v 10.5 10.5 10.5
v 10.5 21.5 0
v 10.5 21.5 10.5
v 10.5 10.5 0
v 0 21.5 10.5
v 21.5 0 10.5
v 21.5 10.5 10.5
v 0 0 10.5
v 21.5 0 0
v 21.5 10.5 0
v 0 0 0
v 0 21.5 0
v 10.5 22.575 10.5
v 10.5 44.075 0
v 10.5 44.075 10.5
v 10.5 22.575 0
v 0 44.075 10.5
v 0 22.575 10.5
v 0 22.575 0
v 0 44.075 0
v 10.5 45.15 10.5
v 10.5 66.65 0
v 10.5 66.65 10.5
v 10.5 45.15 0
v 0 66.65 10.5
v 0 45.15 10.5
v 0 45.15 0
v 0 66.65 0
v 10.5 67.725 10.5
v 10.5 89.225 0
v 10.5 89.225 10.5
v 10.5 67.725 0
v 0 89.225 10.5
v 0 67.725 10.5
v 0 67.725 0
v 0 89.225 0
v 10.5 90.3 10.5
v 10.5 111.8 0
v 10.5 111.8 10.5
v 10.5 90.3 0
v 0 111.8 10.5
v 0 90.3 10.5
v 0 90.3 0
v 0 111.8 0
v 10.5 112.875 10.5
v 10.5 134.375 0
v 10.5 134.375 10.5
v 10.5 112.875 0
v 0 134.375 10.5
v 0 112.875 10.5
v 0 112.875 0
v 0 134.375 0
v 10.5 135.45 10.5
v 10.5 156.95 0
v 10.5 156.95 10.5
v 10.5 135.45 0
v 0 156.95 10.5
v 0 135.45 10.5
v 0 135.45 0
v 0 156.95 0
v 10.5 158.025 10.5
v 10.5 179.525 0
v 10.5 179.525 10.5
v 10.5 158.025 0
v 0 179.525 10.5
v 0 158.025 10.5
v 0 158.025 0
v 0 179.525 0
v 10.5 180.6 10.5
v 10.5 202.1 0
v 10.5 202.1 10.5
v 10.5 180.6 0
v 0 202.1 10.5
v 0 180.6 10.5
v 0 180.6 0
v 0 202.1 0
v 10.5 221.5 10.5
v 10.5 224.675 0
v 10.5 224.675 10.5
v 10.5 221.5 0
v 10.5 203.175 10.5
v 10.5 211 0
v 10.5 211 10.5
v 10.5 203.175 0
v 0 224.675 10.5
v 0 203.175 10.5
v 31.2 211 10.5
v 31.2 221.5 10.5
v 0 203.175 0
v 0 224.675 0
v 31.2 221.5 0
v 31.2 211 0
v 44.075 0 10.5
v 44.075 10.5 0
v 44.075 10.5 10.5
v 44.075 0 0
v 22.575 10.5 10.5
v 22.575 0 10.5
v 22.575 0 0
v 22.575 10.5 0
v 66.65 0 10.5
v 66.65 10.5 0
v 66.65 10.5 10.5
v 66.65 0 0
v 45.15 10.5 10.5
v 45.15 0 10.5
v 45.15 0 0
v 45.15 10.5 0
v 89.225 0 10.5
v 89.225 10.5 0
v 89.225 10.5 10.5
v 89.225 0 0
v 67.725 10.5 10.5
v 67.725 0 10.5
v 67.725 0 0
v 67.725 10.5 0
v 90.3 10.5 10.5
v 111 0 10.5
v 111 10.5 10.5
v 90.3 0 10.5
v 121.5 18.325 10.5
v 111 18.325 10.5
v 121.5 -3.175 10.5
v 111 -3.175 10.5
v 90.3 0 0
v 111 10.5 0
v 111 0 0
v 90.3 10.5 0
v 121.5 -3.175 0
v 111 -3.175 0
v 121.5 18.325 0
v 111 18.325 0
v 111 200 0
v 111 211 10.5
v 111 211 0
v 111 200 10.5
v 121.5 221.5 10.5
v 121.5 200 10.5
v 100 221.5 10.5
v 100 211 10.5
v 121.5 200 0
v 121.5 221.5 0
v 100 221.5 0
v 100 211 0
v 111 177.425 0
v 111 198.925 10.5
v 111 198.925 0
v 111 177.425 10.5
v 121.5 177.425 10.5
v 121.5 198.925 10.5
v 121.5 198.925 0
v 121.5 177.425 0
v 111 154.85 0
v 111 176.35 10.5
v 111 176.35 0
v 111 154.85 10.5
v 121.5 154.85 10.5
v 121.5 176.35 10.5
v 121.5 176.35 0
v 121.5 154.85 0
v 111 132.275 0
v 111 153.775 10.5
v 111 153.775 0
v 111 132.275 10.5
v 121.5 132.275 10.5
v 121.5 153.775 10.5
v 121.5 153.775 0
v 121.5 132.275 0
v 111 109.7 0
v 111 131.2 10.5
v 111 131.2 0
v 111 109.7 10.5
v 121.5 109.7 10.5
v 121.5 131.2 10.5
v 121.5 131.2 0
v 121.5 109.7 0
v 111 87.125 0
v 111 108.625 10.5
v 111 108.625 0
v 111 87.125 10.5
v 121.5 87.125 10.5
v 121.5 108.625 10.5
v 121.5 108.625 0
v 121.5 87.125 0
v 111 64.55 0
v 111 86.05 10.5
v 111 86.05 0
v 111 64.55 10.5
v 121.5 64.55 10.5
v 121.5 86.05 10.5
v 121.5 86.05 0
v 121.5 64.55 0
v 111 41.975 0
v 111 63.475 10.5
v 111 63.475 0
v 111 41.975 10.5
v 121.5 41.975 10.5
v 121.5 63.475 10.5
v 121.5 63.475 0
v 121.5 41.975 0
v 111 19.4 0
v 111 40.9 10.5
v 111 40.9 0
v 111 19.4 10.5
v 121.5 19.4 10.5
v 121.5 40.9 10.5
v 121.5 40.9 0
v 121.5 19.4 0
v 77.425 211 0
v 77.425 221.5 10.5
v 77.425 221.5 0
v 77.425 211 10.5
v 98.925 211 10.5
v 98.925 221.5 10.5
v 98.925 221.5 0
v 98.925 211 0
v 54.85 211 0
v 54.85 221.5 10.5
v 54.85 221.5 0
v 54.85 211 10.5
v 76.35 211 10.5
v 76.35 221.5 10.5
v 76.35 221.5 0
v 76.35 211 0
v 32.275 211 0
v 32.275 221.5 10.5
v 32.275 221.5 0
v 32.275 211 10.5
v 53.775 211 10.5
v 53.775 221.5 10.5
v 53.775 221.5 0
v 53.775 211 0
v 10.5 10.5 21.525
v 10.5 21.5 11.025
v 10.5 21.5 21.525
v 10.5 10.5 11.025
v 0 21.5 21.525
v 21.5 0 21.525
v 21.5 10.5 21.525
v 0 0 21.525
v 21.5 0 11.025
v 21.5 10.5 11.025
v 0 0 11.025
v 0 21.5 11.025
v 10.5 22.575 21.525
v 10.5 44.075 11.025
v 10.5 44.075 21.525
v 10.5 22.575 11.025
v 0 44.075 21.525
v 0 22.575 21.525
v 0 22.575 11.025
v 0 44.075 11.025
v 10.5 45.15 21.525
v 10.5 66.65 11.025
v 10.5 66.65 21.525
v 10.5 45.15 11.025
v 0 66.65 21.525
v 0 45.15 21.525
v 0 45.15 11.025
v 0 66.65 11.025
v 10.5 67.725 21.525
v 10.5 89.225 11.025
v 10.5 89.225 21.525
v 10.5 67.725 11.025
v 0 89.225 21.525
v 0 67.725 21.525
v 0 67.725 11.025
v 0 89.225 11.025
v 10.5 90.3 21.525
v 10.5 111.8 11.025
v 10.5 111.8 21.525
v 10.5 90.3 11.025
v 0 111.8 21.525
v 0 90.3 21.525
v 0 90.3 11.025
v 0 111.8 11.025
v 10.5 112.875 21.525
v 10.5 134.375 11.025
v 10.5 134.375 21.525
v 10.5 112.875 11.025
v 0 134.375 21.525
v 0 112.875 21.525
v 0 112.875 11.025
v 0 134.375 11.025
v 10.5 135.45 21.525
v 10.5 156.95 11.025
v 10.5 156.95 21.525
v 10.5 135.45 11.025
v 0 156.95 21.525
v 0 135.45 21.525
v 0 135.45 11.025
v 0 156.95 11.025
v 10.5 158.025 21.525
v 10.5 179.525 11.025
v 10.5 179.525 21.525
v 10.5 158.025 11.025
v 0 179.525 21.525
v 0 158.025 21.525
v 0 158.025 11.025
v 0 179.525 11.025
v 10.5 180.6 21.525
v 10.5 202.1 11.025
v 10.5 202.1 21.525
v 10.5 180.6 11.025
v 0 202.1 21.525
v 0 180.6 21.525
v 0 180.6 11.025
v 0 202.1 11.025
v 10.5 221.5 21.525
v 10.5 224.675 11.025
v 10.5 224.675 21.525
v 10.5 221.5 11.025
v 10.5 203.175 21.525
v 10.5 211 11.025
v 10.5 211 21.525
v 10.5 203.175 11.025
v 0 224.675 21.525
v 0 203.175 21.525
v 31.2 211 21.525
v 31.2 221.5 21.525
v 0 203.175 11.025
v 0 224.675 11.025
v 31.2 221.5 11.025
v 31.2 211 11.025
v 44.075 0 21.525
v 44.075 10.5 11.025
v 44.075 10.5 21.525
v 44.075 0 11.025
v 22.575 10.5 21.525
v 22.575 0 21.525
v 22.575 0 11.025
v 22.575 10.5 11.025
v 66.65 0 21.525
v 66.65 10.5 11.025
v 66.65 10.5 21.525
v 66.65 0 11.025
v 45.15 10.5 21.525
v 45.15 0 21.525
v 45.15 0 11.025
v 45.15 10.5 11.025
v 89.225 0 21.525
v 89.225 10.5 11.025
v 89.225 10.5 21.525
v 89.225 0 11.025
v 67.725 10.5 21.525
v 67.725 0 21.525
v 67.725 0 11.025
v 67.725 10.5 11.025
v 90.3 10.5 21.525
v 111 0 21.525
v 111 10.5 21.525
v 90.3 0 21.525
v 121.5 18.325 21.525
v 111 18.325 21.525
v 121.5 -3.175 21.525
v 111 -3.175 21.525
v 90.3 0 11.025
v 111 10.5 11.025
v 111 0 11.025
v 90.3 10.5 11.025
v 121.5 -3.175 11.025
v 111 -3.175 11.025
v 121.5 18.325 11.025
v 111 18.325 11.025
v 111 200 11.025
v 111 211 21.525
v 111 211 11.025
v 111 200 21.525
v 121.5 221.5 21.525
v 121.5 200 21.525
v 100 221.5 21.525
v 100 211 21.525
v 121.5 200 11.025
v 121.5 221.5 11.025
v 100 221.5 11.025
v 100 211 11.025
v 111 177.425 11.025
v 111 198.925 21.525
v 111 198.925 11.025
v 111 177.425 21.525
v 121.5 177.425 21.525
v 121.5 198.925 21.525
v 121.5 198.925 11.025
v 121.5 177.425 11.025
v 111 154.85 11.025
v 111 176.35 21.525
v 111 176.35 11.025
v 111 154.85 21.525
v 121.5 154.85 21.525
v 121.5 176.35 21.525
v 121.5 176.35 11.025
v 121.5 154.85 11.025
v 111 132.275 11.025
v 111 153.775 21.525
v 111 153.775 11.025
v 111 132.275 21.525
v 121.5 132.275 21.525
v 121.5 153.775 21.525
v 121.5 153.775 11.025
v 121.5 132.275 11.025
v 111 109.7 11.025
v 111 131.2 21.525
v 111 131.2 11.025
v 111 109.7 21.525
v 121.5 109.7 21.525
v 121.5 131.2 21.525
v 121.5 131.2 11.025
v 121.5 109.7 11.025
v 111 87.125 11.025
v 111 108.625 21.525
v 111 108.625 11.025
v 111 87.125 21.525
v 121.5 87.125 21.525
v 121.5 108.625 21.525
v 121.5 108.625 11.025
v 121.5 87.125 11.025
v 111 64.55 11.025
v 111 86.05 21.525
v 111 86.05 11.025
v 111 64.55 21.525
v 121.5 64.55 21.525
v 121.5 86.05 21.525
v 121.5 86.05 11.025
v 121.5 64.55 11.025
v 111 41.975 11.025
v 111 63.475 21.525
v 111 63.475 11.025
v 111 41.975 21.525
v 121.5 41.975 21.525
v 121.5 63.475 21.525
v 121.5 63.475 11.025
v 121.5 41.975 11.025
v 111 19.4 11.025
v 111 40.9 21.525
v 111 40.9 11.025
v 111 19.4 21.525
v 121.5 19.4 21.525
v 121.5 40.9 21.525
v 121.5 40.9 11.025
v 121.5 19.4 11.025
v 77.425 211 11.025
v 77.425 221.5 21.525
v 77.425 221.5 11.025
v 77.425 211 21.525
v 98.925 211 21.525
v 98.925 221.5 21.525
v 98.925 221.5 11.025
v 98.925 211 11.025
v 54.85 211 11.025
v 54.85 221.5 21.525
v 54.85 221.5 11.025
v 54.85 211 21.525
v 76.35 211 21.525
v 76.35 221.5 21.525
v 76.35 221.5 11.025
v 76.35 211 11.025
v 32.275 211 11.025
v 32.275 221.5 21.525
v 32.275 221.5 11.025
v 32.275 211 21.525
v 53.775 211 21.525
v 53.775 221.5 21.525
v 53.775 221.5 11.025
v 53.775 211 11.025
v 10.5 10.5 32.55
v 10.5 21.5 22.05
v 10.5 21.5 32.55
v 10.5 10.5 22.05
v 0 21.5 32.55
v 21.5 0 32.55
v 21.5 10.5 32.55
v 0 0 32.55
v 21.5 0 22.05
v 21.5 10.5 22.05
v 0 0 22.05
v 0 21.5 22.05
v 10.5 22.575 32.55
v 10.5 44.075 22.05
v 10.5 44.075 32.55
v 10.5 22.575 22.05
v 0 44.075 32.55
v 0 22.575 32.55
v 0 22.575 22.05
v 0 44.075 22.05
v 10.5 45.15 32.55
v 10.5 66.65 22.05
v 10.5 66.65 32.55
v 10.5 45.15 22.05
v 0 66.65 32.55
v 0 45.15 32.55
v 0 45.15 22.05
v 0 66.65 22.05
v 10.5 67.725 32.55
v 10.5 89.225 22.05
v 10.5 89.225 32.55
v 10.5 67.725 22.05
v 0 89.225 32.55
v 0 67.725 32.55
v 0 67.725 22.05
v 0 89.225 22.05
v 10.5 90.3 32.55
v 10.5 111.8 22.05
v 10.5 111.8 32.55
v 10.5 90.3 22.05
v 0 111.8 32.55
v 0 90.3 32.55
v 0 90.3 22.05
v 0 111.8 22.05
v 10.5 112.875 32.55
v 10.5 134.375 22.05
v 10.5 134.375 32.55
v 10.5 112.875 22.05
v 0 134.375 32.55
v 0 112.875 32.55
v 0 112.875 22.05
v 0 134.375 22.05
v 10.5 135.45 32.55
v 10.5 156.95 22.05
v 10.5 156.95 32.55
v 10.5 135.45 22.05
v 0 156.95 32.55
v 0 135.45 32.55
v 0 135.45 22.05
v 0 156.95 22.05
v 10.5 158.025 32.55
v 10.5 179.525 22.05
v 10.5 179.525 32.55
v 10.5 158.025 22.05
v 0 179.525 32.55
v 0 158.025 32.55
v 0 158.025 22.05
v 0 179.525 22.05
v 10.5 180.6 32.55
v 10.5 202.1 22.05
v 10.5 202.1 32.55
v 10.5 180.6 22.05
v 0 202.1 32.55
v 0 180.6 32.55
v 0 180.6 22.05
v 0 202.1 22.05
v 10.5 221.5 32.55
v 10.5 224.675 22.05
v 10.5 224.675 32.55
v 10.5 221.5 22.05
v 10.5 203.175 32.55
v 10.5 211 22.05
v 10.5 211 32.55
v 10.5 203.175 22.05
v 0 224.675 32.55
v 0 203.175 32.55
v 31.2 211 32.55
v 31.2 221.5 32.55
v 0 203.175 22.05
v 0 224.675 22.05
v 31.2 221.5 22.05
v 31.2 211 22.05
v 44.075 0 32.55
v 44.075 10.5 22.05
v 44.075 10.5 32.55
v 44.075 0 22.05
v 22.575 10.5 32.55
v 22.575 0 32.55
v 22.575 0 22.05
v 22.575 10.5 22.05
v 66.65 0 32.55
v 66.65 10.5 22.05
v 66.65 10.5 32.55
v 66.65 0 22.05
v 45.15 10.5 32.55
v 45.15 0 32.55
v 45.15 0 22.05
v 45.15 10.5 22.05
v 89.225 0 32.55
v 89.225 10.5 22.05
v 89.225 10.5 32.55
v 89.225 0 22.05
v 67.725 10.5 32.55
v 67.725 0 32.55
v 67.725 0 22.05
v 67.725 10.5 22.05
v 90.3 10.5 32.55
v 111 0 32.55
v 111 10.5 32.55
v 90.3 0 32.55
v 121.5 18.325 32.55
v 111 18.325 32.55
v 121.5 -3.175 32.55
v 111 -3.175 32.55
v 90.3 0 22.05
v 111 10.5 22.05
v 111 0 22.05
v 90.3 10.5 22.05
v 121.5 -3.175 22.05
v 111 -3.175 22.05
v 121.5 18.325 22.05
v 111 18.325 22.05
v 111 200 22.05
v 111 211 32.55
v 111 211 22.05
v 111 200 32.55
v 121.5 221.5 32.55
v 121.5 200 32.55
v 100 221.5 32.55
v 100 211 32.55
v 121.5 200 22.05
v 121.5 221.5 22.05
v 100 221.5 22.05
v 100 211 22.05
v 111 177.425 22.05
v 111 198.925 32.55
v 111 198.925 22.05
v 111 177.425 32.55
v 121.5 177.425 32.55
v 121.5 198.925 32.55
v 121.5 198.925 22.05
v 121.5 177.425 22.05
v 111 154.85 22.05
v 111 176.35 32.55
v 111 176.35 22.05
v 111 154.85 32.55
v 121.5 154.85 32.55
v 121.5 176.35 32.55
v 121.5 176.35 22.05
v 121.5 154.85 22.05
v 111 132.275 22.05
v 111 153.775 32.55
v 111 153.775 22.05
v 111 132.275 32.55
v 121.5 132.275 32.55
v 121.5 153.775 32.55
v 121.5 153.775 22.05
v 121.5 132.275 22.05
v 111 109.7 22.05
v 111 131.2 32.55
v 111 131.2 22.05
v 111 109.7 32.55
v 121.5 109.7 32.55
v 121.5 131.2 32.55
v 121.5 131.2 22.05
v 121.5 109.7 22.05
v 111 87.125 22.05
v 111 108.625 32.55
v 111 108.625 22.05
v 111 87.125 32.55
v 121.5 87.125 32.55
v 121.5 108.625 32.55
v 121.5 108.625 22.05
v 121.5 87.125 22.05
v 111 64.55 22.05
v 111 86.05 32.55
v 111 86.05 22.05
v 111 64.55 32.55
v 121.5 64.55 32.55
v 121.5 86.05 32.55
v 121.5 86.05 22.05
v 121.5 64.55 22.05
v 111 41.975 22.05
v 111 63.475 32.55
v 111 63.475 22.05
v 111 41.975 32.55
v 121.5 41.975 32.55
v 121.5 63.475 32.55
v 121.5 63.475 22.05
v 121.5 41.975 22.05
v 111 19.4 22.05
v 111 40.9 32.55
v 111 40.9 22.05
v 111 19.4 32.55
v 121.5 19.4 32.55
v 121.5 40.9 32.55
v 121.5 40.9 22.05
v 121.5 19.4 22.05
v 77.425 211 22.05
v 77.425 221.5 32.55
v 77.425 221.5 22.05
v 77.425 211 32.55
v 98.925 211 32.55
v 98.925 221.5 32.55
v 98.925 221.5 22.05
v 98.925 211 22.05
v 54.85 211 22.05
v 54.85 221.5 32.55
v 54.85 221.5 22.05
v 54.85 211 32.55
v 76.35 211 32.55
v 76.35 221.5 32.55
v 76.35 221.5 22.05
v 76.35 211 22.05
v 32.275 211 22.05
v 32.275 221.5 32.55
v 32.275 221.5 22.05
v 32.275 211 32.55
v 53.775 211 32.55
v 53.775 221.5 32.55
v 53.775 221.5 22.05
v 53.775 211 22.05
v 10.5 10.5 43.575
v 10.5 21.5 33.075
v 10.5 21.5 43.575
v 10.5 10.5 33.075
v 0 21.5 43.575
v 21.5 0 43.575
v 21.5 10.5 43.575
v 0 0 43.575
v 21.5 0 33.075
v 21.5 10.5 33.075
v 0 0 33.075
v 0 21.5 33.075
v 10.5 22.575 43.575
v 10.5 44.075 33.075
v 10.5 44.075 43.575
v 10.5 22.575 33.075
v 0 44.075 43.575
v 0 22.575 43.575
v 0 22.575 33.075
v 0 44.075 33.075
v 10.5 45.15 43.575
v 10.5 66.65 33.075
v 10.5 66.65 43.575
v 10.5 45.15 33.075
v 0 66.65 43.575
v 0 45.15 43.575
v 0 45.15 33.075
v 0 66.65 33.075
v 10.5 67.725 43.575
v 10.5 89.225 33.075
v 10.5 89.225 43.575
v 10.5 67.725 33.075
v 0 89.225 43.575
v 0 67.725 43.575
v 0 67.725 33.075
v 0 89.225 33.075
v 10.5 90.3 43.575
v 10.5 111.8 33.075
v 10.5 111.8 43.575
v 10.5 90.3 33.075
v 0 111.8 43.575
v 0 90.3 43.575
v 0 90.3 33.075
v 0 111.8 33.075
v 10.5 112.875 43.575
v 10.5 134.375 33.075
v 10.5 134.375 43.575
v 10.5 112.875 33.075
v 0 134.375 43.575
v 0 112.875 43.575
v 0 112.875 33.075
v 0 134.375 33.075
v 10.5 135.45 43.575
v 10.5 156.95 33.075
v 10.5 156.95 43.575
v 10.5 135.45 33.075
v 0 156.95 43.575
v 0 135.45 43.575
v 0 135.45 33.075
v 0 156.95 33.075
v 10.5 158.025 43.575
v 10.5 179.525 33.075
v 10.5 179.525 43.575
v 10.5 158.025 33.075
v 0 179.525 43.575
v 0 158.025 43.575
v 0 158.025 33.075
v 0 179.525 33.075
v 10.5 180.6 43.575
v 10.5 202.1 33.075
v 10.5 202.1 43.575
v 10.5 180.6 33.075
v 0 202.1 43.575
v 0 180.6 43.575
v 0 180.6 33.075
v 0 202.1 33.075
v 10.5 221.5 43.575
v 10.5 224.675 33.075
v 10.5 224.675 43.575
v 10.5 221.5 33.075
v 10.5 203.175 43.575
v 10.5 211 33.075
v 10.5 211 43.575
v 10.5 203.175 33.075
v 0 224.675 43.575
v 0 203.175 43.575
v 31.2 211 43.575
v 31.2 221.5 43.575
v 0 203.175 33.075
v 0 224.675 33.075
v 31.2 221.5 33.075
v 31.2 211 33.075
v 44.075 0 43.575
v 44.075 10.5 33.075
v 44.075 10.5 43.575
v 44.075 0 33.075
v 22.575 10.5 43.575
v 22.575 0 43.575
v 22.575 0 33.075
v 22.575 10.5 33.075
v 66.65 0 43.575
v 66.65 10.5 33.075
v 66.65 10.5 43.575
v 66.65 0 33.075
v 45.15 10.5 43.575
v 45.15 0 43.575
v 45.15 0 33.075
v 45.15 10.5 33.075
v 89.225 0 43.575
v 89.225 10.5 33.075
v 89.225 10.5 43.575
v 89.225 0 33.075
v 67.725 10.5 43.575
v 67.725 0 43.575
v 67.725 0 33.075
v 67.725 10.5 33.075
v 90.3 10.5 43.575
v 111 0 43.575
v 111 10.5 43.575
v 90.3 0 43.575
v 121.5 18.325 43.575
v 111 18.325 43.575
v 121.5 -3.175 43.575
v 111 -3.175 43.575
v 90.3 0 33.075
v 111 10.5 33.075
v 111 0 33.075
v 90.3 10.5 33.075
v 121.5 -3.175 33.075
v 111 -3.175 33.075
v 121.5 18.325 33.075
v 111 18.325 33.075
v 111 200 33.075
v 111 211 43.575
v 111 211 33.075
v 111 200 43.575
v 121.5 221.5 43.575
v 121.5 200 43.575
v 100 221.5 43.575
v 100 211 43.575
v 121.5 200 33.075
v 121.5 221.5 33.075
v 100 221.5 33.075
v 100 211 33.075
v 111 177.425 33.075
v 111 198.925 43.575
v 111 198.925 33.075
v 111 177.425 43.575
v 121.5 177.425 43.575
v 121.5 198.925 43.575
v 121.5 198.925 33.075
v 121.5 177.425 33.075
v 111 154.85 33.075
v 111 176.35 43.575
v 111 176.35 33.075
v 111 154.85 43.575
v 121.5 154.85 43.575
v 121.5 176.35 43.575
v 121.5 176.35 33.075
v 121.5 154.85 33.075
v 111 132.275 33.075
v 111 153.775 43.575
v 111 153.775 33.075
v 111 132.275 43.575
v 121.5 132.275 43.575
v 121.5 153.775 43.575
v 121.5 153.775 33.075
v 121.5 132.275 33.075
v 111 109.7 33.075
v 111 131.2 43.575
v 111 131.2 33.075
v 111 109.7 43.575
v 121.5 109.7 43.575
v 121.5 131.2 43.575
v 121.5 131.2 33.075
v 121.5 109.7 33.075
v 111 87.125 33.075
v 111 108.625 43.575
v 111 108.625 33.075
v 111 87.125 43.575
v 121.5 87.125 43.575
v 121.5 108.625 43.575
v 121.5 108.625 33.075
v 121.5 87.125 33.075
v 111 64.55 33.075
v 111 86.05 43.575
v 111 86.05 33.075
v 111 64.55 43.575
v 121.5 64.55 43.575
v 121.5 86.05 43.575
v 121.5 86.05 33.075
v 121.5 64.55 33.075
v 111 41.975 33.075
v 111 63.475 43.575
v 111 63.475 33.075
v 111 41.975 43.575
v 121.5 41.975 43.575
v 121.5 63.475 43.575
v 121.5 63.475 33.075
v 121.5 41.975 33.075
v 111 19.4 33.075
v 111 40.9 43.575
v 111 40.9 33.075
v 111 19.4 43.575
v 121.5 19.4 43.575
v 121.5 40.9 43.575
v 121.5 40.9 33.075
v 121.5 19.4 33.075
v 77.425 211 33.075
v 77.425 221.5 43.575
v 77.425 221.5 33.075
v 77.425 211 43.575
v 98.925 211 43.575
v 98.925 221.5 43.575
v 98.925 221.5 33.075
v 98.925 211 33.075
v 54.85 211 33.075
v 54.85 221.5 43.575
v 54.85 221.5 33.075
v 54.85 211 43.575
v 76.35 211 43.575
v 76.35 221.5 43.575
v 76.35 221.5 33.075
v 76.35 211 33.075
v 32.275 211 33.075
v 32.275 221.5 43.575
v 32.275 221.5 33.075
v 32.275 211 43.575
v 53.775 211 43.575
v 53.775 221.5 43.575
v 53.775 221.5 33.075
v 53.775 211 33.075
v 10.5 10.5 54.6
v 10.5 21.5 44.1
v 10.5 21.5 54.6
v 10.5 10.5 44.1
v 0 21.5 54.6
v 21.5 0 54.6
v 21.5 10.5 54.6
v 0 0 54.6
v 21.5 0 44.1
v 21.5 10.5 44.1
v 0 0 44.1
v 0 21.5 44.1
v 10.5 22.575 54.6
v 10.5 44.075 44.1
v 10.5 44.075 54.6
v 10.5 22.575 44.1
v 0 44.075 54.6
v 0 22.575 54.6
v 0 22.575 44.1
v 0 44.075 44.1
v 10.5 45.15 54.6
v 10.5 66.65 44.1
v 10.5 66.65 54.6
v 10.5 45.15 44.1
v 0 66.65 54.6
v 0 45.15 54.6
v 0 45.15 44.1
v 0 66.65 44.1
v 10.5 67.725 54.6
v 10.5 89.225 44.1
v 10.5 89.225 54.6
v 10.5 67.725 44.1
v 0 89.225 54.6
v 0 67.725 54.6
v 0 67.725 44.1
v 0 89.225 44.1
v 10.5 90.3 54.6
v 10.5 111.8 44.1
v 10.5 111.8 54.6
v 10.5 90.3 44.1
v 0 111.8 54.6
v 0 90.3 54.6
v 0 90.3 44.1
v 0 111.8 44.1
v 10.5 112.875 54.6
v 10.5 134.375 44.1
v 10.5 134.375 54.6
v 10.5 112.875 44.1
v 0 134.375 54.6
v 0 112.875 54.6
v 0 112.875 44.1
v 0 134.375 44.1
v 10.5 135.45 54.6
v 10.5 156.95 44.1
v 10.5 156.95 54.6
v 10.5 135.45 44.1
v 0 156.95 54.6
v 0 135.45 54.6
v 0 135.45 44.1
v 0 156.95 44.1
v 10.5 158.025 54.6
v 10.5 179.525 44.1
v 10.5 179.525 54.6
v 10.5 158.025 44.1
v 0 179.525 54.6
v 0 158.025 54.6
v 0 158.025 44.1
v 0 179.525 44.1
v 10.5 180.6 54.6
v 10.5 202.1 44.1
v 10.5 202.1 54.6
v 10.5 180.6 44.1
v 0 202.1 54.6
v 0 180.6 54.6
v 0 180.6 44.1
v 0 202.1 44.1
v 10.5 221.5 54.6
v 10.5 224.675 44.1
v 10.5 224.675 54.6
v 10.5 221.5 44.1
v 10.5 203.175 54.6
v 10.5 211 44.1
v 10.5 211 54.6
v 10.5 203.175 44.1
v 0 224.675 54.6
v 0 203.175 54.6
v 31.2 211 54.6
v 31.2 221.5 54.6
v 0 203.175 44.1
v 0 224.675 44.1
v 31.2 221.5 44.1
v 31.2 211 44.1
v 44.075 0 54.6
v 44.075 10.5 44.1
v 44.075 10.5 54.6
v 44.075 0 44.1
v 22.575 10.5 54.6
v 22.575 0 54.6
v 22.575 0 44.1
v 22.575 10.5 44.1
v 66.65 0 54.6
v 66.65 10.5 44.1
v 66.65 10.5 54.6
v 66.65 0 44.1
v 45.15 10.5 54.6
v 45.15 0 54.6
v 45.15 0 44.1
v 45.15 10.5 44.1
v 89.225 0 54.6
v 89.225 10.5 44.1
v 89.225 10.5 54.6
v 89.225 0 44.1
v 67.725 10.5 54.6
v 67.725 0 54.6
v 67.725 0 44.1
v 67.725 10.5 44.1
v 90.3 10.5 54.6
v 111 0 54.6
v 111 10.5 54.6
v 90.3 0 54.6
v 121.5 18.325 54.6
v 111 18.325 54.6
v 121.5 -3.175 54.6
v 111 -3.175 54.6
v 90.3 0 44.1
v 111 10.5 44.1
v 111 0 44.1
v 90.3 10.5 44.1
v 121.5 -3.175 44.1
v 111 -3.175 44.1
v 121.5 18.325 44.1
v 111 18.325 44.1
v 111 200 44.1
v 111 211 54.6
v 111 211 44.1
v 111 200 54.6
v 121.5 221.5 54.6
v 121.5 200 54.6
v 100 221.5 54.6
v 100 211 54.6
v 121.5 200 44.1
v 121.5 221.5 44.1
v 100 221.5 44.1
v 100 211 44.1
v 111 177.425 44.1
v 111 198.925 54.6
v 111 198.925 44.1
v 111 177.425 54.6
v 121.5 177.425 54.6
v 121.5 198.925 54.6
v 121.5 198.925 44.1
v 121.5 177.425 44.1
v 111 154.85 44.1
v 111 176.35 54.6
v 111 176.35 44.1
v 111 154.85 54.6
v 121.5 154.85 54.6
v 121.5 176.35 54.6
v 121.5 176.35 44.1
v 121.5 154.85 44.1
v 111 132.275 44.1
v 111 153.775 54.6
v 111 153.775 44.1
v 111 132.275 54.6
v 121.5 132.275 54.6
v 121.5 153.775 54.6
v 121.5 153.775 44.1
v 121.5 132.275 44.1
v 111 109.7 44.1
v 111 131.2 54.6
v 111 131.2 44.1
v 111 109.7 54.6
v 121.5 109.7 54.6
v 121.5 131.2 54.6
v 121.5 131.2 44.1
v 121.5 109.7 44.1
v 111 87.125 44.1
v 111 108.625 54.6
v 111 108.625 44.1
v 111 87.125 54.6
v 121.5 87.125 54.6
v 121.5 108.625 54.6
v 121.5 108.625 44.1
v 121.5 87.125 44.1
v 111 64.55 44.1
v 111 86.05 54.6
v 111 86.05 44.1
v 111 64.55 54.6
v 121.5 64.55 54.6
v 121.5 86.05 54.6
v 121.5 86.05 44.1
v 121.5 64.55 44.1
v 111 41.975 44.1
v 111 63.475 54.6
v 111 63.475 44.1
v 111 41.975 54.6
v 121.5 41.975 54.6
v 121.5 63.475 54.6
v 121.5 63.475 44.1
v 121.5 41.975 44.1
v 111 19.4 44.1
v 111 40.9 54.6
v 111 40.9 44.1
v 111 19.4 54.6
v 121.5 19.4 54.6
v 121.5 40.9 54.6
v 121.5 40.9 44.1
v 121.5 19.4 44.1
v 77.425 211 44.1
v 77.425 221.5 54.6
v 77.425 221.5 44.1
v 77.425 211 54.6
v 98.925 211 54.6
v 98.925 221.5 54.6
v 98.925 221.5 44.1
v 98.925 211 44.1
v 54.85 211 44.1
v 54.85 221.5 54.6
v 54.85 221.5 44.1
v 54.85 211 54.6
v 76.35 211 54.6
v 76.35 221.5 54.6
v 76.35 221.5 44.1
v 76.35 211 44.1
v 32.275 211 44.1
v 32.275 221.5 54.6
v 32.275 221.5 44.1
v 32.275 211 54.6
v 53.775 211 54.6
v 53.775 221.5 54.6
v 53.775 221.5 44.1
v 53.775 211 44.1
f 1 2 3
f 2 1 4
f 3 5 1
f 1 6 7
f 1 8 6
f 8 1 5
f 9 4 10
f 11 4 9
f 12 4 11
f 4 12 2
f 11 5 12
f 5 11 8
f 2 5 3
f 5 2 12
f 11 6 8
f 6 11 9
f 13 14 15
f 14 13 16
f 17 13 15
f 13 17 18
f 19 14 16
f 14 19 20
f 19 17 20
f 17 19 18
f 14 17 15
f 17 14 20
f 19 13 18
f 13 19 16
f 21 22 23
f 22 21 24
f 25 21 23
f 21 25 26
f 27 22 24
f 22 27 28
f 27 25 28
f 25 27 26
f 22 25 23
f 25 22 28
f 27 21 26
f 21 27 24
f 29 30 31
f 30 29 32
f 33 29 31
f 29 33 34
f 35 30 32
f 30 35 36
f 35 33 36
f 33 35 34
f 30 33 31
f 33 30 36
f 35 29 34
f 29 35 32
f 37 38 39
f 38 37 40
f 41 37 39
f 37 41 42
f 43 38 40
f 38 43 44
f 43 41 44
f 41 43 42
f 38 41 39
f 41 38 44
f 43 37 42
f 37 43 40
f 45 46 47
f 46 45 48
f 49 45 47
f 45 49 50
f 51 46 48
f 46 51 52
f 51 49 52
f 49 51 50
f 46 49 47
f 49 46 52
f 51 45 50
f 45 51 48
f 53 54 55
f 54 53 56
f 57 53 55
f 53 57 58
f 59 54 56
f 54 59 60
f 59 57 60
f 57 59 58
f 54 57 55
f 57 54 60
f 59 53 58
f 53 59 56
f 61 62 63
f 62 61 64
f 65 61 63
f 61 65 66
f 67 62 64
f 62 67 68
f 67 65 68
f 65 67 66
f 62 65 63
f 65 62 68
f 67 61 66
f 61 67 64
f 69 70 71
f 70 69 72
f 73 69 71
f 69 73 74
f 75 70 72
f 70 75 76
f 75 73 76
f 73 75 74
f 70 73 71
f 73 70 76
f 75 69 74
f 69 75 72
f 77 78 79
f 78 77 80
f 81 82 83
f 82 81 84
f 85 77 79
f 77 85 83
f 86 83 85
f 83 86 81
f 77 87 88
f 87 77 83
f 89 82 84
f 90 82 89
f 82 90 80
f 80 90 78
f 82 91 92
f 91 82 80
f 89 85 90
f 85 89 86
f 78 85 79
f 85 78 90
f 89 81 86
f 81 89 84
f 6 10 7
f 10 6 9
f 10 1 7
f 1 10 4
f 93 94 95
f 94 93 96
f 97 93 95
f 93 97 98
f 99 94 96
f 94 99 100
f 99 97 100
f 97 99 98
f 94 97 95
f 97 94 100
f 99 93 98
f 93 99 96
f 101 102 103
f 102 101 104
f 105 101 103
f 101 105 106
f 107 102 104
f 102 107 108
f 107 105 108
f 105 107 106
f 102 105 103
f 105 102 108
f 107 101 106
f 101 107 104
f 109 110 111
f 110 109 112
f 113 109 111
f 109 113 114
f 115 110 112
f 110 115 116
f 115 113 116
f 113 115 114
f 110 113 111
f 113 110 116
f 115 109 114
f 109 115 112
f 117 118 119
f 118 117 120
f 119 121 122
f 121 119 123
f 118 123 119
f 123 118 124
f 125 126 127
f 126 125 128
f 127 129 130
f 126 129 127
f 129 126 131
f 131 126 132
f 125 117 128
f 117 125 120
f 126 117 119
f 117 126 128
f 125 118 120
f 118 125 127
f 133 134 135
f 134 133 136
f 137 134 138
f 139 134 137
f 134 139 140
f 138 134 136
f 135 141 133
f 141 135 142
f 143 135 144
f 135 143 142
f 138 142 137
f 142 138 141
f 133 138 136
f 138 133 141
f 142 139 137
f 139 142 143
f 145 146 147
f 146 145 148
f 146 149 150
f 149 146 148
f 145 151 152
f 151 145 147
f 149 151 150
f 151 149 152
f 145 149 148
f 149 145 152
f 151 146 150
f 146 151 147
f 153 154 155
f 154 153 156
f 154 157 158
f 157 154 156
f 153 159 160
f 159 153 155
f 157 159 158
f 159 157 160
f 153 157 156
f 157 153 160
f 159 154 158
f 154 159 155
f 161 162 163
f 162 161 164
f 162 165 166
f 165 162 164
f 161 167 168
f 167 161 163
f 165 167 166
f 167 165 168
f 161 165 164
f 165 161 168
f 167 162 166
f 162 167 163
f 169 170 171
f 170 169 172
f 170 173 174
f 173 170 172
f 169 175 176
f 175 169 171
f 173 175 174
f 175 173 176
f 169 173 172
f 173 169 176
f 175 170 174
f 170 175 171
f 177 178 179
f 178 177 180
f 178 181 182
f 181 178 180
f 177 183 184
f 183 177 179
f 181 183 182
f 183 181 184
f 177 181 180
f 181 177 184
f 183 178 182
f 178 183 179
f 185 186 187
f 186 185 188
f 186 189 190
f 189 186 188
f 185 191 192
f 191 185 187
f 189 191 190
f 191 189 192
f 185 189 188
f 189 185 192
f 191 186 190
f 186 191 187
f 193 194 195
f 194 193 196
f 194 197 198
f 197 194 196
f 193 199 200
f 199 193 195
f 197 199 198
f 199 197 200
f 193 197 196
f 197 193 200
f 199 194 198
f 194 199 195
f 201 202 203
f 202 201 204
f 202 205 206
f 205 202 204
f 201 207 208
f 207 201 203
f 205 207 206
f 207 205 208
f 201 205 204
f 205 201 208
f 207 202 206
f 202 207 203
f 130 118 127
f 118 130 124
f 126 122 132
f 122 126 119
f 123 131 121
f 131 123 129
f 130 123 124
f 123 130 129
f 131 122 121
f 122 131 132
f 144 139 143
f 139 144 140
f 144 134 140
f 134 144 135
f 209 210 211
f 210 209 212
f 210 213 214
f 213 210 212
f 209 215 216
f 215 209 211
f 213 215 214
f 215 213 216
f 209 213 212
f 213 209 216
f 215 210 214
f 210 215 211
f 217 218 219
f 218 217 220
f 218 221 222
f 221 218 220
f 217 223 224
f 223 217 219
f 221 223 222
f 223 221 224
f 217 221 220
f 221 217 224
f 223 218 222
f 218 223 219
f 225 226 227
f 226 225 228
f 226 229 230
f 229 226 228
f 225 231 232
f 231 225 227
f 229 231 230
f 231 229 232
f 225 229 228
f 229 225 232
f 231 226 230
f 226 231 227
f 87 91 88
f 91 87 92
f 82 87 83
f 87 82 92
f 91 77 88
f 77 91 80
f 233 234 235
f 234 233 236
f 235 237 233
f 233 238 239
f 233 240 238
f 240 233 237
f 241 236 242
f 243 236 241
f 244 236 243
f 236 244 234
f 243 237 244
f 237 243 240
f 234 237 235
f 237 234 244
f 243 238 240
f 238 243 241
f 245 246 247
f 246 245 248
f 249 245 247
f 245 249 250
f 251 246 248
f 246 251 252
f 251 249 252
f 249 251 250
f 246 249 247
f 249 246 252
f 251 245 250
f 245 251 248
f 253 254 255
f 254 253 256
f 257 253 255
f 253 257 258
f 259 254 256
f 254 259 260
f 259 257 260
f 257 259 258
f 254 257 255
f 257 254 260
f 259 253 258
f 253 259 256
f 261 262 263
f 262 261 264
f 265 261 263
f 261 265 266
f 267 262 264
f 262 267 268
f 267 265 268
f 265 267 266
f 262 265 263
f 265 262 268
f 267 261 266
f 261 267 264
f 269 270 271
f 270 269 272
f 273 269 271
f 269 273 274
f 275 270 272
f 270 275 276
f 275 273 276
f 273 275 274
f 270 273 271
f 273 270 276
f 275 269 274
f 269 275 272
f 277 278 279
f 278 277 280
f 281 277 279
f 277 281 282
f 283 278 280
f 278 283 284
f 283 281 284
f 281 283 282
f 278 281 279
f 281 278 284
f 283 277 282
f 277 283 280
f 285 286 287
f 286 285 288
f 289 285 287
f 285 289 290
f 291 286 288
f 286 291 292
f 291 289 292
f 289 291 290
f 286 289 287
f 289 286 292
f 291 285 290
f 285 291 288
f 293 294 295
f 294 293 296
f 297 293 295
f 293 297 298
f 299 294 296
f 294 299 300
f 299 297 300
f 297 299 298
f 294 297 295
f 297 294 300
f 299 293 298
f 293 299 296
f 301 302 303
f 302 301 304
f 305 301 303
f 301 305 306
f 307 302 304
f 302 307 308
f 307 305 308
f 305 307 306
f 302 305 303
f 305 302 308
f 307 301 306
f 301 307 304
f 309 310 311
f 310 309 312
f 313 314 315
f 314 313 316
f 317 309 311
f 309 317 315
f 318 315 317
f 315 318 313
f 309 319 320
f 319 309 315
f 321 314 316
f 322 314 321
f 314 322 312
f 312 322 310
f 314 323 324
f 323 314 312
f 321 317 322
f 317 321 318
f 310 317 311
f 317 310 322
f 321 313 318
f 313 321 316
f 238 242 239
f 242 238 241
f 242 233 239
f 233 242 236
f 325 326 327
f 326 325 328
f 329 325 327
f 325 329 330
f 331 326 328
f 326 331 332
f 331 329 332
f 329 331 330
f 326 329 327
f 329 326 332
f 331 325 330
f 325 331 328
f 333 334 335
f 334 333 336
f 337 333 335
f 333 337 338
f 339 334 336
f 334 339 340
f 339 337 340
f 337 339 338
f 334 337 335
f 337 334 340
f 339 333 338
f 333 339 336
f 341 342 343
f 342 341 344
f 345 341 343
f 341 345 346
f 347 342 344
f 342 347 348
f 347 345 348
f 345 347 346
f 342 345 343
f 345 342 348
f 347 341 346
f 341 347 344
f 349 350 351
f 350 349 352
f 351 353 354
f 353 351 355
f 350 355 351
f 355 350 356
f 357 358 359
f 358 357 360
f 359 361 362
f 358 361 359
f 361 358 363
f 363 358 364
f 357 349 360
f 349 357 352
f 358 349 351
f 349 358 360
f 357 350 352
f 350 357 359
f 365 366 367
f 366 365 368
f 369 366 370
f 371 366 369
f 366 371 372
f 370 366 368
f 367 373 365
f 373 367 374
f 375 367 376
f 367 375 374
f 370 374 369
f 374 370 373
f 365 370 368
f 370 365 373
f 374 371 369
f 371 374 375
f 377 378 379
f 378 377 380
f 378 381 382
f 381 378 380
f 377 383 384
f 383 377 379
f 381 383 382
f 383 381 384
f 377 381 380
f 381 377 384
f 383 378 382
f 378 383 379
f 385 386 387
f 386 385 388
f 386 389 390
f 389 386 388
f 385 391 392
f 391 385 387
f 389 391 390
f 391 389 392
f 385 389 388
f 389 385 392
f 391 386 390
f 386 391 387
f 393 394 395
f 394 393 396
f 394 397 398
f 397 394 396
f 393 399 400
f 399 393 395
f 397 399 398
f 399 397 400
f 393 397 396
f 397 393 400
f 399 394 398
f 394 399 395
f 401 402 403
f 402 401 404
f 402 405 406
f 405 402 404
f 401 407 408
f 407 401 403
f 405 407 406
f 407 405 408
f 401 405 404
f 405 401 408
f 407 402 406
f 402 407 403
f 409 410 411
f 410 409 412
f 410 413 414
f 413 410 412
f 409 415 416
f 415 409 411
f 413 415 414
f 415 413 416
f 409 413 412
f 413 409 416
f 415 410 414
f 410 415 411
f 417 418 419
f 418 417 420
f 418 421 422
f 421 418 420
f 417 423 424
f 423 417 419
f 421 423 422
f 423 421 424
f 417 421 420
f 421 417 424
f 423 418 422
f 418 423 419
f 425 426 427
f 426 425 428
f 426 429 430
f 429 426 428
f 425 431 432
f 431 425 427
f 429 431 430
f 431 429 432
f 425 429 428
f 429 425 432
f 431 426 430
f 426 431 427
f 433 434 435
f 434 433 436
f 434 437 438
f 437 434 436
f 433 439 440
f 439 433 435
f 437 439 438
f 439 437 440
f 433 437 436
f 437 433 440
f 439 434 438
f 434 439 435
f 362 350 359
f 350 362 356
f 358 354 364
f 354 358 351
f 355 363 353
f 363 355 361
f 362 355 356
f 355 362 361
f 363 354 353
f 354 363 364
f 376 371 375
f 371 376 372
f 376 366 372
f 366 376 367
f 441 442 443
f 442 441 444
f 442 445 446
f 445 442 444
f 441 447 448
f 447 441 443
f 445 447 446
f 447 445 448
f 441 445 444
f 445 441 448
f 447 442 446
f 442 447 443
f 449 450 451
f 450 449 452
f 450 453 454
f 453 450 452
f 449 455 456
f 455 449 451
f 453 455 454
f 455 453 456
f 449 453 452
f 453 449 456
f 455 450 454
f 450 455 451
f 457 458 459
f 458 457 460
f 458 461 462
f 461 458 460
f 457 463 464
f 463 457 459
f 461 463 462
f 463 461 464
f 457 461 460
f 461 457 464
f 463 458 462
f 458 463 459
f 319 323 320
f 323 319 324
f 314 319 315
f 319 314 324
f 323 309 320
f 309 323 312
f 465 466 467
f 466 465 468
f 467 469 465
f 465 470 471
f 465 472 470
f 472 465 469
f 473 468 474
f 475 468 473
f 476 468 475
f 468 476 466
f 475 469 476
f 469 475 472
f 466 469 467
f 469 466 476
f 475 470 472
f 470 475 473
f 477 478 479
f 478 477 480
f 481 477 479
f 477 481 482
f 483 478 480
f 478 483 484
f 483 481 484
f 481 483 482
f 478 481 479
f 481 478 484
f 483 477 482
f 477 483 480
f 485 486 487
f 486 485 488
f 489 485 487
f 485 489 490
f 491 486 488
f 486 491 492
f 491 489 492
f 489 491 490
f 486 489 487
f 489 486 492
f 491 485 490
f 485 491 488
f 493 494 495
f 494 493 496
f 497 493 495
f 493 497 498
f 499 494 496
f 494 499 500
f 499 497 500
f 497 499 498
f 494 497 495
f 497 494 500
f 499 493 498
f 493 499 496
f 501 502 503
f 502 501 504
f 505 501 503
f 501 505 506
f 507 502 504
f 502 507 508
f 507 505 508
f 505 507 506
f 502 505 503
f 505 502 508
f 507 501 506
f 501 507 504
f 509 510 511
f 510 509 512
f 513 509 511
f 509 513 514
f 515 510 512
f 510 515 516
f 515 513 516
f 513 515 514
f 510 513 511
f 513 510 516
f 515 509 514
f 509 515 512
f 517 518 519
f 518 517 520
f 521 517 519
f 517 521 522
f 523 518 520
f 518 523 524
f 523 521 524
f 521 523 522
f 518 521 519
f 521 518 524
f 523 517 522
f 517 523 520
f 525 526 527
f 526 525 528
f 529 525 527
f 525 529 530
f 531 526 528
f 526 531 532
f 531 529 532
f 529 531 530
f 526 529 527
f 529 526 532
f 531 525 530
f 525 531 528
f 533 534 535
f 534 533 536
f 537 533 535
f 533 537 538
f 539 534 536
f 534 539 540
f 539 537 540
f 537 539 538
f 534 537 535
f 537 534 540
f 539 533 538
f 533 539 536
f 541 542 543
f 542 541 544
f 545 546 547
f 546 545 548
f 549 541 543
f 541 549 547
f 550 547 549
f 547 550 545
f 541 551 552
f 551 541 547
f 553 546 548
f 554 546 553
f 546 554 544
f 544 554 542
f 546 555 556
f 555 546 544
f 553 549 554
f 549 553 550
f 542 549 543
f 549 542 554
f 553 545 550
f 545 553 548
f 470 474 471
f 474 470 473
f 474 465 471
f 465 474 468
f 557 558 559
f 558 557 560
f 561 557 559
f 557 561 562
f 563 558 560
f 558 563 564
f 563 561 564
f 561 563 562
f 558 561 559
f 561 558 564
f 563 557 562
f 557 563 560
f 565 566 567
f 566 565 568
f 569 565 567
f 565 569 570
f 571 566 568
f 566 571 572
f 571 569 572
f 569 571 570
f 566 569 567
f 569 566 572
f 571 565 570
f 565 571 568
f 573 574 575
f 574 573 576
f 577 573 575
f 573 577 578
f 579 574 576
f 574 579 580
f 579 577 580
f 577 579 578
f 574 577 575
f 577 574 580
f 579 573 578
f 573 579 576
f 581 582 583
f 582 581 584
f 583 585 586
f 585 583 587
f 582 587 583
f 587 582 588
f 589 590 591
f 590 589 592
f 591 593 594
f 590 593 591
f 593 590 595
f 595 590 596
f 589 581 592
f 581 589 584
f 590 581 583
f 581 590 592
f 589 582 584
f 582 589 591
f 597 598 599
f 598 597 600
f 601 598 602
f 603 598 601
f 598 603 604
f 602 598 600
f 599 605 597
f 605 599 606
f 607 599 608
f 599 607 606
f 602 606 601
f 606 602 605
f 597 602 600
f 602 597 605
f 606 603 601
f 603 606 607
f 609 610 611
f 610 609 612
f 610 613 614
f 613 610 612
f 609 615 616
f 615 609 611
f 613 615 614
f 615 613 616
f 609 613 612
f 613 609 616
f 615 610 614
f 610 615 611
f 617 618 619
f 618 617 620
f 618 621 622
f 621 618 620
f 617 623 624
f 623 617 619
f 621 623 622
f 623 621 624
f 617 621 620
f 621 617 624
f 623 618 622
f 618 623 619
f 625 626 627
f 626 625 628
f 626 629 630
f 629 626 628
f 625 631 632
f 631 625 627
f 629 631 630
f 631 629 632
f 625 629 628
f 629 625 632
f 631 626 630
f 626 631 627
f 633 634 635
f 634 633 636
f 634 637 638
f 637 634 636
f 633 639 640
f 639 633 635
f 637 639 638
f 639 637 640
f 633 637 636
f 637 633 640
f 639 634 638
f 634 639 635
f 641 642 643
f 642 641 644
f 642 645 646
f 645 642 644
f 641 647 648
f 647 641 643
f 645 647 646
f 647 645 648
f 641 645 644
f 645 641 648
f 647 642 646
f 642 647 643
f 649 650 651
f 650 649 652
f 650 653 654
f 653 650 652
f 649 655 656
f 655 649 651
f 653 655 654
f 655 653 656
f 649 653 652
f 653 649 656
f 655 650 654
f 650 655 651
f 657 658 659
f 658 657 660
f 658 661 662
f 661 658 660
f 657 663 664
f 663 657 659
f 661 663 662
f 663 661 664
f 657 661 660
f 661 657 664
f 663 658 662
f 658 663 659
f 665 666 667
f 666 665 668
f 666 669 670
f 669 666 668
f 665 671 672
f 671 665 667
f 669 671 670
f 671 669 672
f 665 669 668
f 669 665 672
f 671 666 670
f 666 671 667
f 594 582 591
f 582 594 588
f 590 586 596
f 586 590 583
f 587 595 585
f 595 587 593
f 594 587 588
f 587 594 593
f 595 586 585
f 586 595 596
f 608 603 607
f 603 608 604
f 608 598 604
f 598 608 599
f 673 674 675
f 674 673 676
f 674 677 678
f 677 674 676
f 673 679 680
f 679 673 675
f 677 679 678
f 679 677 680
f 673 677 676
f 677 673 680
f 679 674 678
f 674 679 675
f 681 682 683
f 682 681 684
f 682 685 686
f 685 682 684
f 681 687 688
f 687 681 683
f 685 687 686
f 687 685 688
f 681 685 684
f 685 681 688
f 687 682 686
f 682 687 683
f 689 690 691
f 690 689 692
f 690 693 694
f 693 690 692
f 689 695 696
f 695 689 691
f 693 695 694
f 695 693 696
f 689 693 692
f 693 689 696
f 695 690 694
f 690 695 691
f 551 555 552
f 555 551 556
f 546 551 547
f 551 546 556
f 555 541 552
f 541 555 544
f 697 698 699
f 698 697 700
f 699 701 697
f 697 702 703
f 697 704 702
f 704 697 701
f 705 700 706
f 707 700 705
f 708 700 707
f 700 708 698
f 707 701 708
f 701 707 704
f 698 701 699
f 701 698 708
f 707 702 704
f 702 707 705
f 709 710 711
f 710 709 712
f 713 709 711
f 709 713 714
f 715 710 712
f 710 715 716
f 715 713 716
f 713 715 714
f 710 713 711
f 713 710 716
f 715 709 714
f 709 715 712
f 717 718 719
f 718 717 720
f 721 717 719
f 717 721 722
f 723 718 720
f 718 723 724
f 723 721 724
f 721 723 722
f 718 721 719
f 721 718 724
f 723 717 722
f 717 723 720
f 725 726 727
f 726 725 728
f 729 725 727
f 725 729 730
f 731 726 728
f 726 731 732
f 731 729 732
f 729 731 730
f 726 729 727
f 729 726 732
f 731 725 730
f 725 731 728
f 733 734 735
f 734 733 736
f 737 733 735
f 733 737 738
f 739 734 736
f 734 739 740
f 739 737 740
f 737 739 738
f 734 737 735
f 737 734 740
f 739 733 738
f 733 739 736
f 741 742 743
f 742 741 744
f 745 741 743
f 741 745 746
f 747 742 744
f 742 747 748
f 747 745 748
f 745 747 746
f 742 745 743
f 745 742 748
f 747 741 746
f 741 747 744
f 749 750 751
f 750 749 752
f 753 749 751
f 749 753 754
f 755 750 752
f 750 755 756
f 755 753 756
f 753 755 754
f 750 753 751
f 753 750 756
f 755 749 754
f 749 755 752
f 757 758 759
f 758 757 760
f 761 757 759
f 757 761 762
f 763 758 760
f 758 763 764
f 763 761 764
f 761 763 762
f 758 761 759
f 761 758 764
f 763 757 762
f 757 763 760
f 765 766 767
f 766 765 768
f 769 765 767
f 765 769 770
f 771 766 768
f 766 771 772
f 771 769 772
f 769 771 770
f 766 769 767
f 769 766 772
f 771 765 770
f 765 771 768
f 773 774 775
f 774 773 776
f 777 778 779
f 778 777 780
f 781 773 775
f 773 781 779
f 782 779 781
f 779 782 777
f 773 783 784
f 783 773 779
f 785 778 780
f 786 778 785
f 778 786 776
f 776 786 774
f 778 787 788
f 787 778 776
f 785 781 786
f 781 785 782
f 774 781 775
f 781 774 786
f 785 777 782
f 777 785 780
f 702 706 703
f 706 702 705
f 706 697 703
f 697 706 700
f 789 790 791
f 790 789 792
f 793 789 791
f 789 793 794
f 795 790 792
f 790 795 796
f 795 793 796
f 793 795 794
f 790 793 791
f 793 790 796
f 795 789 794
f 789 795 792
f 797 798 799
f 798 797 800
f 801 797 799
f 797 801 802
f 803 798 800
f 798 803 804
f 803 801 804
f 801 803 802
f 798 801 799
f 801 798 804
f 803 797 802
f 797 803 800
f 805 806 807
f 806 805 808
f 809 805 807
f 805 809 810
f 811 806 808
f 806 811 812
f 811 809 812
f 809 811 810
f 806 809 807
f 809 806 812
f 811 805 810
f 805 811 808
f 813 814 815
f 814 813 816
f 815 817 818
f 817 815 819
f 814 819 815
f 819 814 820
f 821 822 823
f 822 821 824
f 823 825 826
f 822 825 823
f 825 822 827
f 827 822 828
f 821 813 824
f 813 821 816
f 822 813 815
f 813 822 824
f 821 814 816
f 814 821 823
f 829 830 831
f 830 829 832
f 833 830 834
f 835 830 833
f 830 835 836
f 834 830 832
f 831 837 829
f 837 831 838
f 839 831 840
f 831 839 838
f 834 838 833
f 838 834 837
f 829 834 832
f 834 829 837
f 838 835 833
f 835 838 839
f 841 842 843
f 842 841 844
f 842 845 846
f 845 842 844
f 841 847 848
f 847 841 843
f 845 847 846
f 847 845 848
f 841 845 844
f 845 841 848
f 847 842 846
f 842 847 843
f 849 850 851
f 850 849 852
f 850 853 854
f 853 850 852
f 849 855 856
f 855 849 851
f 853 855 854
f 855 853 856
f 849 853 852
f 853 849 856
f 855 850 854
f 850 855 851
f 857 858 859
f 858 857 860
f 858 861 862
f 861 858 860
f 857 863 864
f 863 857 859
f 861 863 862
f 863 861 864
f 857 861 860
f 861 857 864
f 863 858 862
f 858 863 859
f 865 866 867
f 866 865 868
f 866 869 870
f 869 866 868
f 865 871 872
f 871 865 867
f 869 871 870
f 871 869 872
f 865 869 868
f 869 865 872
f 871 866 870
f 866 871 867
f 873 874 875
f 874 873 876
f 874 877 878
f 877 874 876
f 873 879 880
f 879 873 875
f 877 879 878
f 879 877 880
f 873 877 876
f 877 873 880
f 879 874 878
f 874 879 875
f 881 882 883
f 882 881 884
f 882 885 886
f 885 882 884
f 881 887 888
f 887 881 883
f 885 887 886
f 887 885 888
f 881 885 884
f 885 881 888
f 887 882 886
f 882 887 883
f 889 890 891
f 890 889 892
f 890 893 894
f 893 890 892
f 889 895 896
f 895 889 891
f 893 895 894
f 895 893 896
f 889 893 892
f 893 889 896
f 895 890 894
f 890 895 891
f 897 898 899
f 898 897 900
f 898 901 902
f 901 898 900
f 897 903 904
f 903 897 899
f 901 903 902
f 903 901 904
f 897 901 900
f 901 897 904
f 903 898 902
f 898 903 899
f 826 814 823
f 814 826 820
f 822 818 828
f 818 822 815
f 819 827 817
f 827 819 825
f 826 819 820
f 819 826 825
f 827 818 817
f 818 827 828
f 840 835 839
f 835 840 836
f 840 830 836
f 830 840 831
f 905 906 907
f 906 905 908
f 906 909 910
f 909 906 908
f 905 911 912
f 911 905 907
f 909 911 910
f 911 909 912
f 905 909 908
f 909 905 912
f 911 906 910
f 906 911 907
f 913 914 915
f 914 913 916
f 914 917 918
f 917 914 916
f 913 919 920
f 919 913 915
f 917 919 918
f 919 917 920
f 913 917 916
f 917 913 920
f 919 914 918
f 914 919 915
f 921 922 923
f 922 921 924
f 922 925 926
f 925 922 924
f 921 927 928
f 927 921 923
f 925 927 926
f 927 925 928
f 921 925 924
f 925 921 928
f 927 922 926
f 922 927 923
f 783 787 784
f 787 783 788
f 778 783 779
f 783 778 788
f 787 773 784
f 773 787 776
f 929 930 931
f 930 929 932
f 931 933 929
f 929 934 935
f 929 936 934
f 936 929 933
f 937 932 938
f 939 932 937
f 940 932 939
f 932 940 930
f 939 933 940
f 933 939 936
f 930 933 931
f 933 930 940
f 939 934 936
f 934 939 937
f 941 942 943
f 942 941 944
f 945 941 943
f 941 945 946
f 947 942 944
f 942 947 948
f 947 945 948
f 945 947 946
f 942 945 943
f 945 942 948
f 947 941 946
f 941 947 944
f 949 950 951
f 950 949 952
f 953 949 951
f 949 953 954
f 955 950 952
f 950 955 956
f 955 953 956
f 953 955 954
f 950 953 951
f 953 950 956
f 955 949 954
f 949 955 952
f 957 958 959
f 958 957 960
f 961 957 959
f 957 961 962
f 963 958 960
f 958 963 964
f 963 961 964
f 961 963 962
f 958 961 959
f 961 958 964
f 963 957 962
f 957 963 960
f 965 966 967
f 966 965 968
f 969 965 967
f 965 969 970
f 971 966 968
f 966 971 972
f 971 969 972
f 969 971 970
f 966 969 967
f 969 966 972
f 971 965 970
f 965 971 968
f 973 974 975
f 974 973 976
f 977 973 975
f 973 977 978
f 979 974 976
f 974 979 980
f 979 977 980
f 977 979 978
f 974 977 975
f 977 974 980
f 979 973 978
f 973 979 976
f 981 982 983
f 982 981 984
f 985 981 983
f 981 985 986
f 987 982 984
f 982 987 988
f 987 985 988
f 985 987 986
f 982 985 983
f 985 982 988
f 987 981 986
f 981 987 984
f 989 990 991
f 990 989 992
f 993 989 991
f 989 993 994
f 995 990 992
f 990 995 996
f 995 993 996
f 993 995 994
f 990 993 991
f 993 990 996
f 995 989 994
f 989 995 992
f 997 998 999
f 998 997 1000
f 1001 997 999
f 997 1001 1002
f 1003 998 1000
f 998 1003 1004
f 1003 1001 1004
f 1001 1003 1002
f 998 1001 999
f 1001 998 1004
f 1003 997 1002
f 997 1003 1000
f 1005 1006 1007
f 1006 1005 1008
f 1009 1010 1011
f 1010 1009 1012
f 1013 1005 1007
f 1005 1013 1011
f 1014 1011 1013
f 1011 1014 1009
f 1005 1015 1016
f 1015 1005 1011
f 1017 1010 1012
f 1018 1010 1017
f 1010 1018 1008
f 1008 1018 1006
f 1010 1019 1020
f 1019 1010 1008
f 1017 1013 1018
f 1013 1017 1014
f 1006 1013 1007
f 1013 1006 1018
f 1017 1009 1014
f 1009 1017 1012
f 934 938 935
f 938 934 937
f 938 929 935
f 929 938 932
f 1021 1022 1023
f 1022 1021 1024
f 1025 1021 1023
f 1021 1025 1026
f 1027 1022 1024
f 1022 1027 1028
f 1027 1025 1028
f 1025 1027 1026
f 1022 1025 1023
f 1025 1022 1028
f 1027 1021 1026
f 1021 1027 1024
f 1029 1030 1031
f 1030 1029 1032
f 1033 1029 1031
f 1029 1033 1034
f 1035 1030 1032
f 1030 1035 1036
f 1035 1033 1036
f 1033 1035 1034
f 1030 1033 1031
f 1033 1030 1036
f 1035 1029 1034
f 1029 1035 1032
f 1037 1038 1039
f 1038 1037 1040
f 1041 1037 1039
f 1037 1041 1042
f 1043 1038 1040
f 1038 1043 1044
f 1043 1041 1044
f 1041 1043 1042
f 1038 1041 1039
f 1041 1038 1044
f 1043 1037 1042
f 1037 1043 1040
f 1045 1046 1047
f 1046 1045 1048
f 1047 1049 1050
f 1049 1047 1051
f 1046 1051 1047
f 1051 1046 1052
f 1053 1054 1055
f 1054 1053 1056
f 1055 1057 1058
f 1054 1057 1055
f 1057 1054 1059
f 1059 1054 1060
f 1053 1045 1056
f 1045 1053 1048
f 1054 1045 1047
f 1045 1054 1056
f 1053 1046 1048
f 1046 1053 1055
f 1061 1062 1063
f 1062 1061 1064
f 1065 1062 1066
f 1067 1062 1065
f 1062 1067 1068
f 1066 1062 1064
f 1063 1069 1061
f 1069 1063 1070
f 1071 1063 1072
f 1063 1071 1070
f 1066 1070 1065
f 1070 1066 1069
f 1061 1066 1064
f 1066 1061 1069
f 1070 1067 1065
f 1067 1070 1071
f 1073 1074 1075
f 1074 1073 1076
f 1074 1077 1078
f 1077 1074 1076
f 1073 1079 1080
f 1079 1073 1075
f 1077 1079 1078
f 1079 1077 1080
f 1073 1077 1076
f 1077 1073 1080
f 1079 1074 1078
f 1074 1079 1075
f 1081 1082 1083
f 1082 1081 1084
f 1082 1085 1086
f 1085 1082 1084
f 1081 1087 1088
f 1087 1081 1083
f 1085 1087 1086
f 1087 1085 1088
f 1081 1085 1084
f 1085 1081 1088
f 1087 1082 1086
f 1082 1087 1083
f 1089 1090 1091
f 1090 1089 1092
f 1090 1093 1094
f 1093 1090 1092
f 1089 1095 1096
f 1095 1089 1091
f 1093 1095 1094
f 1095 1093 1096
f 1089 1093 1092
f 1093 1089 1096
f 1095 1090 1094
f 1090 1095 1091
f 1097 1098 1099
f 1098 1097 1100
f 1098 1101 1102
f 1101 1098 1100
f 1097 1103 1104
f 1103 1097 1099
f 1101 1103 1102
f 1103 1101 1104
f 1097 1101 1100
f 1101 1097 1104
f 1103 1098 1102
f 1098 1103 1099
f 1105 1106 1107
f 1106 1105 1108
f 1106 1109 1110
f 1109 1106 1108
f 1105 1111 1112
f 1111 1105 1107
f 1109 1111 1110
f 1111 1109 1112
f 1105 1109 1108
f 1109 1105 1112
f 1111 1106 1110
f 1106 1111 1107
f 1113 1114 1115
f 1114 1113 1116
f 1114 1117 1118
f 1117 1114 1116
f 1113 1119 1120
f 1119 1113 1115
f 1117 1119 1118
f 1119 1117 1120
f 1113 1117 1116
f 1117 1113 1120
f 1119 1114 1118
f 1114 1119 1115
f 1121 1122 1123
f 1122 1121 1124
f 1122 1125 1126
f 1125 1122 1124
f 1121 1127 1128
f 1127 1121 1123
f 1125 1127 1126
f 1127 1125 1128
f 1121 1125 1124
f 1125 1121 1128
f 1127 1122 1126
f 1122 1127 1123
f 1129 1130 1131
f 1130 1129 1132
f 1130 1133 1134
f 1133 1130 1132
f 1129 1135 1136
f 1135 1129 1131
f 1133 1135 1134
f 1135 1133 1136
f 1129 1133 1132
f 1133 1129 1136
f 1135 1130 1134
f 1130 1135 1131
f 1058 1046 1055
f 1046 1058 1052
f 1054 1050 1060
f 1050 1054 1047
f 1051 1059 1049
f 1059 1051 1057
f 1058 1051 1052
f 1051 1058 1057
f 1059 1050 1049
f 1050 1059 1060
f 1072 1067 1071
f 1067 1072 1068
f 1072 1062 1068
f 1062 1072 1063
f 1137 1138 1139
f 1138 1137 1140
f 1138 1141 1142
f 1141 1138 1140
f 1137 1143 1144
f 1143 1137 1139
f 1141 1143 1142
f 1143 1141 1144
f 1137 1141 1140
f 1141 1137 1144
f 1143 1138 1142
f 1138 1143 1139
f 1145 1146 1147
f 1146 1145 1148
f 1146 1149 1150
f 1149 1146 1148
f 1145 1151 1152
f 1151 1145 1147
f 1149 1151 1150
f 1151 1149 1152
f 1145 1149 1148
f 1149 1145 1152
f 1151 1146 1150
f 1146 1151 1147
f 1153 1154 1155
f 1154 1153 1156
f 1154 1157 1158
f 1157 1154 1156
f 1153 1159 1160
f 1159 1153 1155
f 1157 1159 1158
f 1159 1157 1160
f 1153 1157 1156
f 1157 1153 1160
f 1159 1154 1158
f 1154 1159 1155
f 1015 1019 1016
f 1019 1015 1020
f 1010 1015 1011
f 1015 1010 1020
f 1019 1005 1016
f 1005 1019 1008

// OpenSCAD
/*This is just a very basic model that generates the brick reservoir based on the size of the digester*/

/*Digester Size*/
dl=200;//length
dw=100;//width
dh=50;


/*Brick Parameters*/
h=10.5;//height
w=10.5;//width
l=21.5;//length

i_end=dl/l;
z_end=dw/l;
y_end=dh/h;



module frame(){
module line(){
for (i=[0:i_end])
   translate([0,i*(l+l*0.05),0])
     cube([w,l,h]);


for (z=[0:z_end])
   translate([z*(l+l*0.05),0,0])
     rotate()
     cube([l,w,h]);
}

line();
translate([dw+l,dl+l,0])
rotate([180,180,0])line();
}

for (i=[0:y_end])
  translate([0,0,i*(h+(h*0.05))])
  //translate([0,0,20*i])
    frame();


/*$fn=64;
for ( i = [0 : 5] ){
    rotate( i * 60, [1, 0, 0])
    translate([0, 10, 0])
    sphere(r = 10);
}*/
